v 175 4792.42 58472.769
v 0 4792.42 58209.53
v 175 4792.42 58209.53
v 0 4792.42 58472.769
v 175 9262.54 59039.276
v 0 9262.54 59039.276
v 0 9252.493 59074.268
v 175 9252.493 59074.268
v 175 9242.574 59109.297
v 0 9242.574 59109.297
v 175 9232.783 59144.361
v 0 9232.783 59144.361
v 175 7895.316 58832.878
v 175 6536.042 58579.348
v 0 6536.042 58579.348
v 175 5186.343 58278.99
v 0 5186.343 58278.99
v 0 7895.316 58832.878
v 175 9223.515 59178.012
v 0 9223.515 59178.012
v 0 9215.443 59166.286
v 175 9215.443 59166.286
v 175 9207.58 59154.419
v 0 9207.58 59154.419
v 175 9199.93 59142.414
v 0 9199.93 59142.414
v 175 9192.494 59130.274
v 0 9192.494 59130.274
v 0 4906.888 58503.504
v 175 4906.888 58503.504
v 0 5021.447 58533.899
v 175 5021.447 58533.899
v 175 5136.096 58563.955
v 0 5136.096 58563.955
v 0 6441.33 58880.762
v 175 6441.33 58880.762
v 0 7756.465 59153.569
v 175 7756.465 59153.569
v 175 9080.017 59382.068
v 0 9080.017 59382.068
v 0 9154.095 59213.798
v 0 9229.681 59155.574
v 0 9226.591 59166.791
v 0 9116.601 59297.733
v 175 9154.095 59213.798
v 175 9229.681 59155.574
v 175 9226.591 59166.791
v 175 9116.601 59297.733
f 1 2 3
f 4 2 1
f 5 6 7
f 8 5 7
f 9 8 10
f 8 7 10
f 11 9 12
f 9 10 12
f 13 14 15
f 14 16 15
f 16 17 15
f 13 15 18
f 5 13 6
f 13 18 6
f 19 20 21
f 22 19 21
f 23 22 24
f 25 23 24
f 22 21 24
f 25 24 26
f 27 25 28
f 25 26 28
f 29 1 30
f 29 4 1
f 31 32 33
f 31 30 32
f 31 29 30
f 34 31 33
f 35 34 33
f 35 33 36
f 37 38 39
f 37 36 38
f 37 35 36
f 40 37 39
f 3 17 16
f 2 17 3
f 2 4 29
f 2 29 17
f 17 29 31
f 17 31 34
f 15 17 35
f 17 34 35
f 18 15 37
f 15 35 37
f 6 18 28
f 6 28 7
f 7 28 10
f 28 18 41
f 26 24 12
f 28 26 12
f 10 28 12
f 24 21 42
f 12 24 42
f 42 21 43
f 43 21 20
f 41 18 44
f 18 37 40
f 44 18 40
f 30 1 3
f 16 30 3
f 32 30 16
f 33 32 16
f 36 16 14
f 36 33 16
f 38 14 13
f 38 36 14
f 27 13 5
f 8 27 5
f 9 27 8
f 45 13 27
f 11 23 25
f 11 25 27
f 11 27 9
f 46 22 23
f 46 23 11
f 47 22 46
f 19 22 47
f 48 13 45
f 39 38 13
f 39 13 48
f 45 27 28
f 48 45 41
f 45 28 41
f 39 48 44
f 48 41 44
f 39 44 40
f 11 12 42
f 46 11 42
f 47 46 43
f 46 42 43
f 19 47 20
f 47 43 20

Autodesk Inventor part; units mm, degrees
ref_plane "YZ Plane" through (0, 0, 0) normal (1, 0, 0) x (0, 1, 0)
ref_plane "XZ Plane" through (0, 0, 0) normal (0, 1, 0) x (-1, 0, 0)
ref_plane "XY Plane" through (0, 0, 0) normal (0, 0, 1) x (1, 0, 0)
sketch "Sketch1" plane through (0, 0, 0) normal (1, 0, 0) x (0, 1, 0)
  arc A0 (9232.7828, 59144.361) -> (9262.54, 59039.2764) centre (18869.1867, 61816.3864) ccw
  arc A1 (9080.0173, 59382.0678) -> (9192.4941, 59130.2744) centre (16896.114, 62722.5217) ccw
  arc A2 (9084.1758, 59429.1257) -> (9080.0173, 59382.0678) centre (9125.9944, 59401.7175) ccw
  ellipse E0 centre (9878.3873, 58718.5093) end of major axis (9878.3658, 59518.5093) minor radius 800 (9223.5152, 59178.0117) -> (9192.4941, 59130.2744) ccw
  arc A3 (9223.5152, 59178.0117) -> (9262.54, 59039.2764) centre (18869.1867, 61816.3864) ccw
  arc A4 (9262.54, 59039.2764) -> (5186.343, 58278.9896) centre (14548.8436, 19390.1277) ccw
  arc A5 (9080.0173, 59382.0678) -> (5136.0959, 58563.9551) centre (15222.25, 19856.4688) ccw
  line L0 (5186.343, 58278.9896) -> (4792.4199, 58209.5304)
  line L1 (4792.4199, 58209.5304) -> (4792.4199, 58472.769)
  arc A6 (5136.0959, 58563.9551) -> (4792.4199, 58472.769) centre (15222.25, 19856.4688) ccw
  point P0 (0, 0)
  point P1 (9076.1884, 59406.1188)
  point P2 (9232.7828, 59144.361)
  dimension "d0" = 40000
  dimension "d1" = 40000
  dimension "d2" = 400
extrude "Extrusion1" add sketch "Sketch1" along normal blind 175
properties part number "side_curve_beam_02" material "Wood (Maple)"
